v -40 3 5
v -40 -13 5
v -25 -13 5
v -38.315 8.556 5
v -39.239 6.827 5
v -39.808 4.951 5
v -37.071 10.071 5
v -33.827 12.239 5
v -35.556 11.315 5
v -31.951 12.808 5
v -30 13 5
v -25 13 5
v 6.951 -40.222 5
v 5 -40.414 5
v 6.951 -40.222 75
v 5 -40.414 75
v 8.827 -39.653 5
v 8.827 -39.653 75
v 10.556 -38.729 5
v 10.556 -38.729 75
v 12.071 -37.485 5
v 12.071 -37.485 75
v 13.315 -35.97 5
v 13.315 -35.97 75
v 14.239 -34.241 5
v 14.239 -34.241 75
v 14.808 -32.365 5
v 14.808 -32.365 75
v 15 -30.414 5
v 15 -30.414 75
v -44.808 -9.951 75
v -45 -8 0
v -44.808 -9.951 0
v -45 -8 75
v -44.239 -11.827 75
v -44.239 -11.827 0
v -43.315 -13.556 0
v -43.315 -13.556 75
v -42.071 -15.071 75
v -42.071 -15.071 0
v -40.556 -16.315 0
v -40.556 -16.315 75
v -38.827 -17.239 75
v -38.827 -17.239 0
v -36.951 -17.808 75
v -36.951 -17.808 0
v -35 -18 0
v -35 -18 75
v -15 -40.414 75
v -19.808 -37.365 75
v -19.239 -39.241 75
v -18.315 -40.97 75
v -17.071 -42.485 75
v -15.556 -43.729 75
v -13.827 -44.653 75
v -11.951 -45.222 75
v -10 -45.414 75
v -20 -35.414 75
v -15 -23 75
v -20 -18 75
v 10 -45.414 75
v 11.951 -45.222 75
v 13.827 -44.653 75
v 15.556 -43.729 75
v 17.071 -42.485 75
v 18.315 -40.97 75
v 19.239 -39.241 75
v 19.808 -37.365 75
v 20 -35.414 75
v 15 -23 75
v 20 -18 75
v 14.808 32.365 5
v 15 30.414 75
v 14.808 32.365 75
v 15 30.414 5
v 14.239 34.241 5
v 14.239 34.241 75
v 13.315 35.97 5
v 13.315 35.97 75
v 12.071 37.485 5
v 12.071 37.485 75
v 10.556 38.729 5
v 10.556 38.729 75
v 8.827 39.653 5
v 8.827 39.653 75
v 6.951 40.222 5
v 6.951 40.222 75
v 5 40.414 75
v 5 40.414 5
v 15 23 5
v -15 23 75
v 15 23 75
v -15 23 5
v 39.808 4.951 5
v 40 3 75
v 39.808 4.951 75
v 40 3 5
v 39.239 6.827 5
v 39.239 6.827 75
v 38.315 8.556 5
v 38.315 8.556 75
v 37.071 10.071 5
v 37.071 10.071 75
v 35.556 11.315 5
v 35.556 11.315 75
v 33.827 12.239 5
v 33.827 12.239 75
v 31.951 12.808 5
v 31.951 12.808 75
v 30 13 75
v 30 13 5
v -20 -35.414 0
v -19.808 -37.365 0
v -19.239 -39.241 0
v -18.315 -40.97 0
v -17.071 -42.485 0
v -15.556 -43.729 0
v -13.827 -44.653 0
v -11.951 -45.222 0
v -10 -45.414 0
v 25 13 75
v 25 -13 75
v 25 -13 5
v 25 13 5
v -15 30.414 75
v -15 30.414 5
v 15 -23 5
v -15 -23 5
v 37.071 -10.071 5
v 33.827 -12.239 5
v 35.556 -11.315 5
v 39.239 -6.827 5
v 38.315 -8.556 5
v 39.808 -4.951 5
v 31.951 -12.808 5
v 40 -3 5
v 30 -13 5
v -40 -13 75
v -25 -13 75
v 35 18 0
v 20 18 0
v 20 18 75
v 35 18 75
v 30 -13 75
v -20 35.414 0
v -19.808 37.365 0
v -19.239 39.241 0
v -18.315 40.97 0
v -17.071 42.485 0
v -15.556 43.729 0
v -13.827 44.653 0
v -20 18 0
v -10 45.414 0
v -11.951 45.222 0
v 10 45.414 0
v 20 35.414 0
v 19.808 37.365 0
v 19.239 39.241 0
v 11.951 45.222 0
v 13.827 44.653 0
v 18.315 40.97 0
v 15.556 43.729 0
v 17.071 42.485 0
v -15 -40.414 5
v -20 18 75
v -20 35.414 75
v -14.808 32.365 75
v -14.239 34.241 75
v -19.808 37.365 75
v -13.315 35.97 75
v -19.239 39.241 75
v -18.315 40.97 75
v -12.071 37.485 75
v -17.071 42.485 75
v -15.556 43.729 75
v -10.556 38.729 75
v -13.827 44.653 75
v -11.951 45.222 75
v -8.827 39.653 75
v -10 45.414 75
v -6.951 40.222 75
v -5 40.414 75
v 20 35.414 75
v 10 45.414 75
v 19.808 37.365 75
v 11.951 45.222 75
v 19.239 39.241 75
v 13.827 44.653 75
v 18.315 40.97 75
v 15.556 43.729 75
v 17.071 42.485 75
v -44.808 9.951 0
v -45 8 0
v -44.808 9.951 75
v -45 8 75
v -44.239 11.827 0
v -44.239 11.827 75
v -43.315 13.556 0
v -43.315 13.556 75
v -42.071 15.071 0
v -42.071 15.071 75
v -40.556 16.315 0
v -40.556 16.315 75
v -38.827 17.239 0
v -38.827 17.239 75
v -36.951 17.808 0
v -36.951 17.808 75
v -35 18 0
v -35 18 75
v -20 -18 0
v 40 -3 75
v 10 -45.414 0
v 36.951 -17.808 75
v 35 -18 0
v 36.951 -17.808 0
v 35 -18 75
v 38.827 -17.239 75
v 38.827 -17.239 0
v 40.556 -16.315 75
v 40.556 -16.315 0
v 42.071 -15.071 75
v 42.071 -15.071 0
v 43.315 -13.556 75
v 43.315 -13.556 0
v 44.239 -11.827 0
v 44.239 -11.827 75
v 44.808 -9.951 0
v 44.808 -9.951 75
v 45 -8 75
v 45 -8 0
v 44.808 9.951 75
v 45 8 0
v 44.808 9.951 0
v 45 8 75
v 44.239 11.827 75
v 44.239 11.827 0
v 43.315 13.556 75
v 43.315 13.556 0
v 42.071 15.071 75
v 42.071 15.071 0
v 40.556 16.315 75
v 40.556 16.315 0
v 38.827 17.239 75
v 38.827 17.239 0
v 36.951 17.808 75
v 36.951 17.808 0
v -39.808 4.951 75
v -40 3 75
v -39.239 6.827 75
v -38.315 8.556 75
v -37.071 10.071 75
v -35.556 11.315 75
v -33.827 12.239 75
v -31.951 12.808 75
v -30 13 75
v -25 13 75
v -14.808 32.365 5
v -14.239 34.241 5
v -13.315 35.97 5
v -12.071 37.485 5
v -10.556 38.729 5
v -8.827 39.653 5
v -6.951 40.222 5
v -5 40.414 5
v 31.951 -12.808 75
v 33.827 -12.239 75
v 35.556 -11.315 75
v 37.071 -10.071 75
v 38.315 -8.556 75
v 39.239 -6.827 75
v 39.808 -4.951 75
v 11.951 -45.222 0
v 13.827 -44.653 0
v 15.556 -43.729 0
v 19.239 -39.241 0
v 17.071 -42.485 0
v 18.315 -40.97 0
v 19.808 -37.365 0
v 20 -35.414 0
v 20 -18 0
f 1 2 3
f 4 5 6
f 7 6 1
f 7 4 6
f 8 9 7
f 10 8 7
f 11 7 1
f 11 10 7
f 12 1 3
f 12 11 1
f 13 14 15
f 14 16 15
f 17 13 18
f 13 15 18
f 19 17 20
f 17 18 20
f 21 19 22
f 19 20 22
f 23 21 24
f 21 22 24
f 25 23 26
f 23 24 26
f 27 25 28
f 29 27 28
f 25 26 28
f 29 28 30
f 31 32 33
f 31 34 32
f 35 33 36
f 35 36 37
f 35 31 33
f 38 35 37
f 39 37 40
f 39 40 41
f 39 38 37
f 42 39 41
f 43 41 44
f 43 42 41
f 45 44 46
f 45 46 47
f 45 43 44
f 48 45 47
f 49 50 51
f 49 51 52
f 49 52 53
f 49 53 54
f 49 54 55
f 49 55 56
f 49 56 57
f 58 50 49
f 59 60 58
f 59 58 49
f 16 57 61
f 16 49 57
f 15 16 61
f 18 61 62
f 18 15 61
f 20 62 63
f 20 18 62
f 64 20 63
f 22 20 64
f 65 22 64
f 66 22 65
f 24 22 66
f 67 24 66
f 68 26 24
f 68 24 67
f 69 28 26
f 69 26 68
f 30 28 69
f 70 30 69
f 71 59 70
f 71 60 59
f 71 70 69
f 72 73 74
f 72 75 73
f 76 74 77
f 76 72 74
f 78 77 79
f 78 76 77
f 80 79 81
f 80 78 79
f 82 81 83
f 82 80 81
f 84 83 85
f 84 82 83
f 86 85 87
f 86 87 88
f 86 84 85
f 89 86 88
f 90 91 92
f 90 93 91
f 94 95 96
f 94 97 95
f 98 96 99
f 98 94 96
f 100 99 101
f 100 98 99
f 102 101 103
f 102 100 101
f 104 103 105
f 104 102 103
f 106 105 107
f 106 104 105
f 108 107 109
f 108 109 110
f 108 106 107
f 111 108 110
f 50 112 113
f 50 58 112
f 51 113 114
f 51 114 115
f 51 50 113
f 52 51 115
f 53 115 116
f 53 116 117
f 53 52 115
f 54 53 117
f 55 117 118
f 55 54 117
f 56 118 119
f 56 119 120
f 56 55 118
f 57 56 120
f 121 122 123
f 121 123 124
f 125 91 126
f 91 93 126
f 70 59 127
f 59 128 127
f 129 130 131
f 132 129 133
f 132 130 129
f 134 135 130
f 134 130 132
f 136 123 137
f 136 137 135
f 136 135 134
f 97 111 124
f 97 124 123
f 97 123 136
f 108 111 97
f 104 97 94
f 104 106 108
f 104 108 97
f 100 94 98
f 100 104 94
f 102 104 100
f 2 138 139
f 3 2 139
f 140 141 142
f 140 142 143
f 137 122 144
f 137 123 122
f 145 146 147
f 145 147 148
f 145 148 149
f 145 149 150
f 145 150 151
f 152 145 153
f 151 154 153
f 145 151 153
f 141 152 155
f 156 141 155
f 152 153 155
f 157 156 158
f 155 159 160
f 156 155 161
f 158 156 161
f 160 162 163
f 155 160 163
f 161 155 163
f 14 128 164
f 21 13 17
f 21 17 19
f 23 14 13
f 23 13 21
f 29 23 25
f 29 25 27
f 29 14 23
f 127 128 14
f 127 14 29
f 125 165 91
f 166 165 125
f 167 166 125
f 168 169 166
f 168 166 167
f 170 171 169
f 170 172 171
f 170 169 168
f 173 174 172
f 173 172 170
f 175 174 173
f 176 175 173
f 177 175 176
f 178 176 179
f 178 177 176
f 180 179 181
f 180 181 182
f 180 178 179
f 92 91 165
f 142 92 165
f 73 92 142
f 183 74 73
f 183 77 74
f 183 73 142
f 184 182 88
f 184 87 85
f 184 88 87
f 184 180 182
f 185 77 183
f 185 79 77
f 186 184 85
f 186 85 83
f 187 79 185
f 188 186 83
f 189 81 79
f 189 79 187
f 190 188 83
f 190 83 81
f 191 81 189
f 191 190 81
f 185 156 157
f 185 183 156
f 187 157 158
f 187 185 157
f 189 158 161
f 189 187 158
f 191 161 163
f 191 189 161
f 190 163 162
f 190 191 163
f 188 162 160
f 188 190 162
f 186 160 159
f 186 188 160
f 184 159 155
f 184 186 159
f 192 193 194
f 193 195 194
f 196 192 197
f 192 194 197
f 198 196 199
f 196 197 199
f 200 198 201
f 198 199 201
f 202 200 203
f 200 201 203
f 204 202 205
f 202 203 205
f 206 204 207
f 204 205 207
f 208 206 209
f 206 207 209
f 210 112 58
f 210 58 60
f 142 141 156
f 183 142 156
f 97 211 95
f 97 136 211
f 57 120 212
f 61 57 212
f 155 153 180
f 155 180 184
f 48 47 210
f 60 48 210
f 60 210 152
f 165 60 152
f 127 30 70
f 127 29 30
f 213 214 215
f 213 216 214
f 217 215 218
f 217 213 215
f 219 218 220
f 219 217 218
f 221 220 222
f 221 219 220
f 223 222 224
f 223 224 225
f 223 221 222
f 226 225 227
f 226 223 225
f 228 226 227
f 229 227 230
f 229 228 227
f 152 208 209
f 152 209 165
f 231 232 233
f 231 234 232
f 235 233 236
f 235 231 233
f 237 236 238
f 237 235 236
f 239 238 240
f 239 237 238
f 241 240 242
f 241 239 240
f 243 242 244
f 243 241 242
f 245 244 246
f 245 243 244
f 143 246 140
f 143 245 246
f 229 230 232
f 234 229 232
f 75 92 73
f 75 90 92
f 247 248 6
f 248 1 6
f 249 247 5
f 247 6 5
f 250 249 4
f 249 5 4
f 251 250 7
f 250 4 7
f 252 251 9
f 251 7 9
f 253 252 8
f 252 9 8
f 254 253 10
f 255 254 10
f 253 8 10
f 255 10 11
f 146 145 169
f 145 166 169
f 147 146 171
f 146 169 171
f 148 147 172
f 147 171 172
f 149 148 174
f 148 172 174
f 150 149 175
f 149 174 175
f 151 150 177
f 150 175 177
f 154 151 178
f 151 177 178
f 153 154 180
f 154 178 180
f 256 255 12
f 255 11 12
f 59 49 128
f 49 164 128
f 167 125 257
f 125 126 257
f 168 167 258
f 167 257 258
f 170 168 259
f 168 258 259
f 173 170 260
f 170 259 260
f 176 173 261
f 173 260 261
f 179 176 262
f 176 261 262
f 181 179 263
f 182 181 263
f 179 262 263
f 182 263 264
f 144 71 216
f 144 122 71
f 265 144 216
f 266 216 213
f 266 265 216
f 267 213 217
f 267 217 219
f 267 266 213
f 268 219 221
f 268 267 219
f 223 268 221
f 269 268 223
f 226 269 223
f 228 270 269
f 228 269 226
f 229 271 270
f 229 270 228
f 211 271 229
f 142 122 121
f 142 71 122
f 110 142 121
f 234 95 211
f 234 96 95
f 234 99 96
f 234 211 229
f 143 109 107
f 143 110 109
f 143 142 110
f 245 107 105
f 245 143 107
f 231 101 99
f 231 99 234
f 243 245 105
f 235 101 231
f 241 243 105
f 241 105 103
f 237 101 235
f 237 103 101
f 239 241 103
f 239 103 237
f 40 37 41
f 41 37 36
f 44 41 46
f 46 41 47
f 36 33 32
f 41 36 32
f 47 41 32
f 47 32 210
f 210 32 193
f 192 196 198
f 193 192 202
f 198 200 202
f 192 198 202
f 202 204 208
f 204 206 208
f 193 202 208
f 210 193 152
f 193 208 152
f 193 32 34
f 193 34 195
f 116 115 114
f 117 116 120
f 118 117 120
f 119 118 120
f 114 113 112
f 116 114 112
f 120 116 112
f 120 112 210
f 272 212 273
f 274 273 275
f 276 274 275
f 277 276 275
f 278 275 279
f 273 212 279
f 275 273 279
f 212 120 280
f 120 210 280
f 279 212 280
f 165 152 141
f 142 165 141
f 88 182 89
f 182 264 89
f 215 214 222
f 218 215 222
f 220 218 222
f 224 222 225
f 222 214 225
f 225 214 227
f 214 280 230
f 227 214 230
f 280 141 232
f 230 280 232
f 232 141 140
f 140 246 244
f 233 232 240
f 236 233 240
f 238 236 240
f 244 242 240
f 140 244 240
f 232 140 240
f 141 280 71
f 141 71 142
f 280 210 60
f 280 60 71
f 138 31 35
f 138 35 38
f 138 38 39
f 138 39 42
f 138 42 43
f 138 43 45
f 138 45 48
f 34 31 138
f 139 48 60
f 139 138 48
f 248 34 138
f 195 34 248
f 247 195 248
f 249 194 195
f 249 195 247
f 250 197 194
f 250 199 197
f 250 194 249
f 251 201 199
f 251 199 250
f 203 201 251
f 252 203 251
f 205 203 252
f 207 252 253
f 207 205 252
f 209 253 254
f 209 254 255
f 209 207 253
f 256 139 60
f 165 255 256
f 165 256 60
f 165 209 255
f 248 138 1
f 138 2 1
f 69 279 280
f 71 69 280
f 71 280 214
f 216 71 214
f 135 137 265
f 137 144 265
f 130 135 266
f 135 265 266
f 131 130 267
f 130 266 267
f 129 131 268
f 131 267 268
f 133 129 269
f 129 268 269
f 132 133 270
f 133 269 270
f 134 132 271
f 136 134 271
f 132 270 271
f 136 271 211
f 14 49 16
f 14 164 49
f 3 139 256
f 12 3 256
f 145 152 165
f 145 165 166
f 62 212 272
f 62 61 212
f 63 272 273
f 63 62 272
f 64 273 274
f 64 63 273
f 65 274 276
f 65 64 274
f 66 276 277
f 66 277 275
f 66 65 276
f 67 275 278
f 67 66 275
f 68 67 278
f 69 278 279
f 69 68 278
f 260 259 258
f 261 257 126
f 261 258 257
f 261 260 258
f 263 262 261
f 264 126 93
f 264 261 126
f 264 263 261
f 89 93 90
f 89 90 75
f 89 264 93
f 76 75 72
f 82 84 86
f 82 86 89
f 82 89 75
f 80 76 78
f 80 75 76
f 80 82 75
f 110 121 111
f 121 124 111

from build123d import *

# Parameters (mm, degrees)
F0_W     = 40
F0_H     = 27.4141125083
F1_DEPTH = 75
F0_W_2   = 25
F0_H_2   = 36
F2_T     = -5
F2_2_T   = -5
F2_3_T   = -5
F2_4_T   = -5
F3_R     = 10
F3_2_R   = 10
F3_3_R   = 10
F3_4_R   = 10


with BuildPart() as f1:
    # F0 (on Top) → F1 (new body)
    with BuildSketch(Plane.XY):
        with Locations((0, 31.7070562541)):
            Rectangle(F0_W, F0_H)
    extrude(amount=F1_DEPTH)

    # F2#3
    f2_3_openings = [f1.faces().sort_by_distance(p)[0] for p in [
        (0, 31.707056, 75),
    ]]
    offset(amount=F2_3_T, openings=f2_3_openings)

    # F3#2
    f3_2_edges = [f1.edges().sort_by_distance(p)[0] for p in [
        (20, 45.414113, 37.5),
        (-20, 45.414113, 37.5),
        (15, 40.414113, 40),
        (-15, 40.414113, 40),
    ]]
    fillet(f3_2_edges, radius=F3_2_R)


with BuildPart() as f1b:
    # F0 (on Top) → F1, piece 2 (new body)
    with BuildSketch(Plane.XY):
        with Locations((32.5, 0)):
            Rectangle(F0_W_2, F0_H_2)
    extrude(amount=F1_DEPTH)

    # F2#2
    f2_2_openings = [f1b.faces().sort_by_distance(p)[0] for p in [
        (32.5, 0, 75),
    ]]
    offset(amount=F2_2_T, openings=f2_2_openings)

    # F3
    f3_edges = [f1b.edges().sort_by_distance(p)[0] for p in [
        (45, 18, 37.5),
        (45, -18, 37.5),
        (40, -13, 40),
        (40, 13, 40),
    ]]
    fillet(f3_edges, radius=F3_R)


with BuildPart() as f1c:
    # F0 (on Top) → F1, piece 3 (new body)
    with BuildSketch(Plane.XY):
        with Locations((-32.5, 0)):
            Rectangle(F0_W_2, F0_H_2)
    extrude(amount=F1_DEPTH)

    # F2#4
    f2_4_openings = [f1c.faces().sort_by_distance(p)[0] for p in [
        (-32.5, 0, 75),
    ]]
    offset(amount=F2_4_T, openings=f2_4_openings)

    # F3#3
    f3_3_edges = [f1c.edges().sort_by_distance(p)[0] for p in [
        (-45, 18, 37.5),
        (-45, -18, 37.5),
        (-40, 13, 40),
    ]]
    fillet(f3_3_edges, radius=F3_3_R)


with BuildPart() as f1d:
    # F0 (on Top) → F1, piece 4 (new body)
    with BuildSketch(Plane.XY):
        with Locations((0, -31.7070562541)):
            Rectangle(F0_W, F0_H)
    extrude(amount=F1_DEPTH)

    # F2
    f2_openings = [f1d.faces().sort_by_distance(p)[0] for p in [
        (0, -31.707056, 75),
    ]]
    offset(amount=F2_T, openings=f2_openings)

    # F3#4
    f3_4_edges = [f1d.edges().sort_by_distance(p)[0] for p in [
        (20, -45.414113, 37.5),
        (-20, -45.414113, 37.5),
        (15, -40.414113, 40),
    ]]
    fillet(f3_4_edges, radius=F3_4_R)


solid = Compound([f1.part, f1b.part, f1c.part, f1d.part])
